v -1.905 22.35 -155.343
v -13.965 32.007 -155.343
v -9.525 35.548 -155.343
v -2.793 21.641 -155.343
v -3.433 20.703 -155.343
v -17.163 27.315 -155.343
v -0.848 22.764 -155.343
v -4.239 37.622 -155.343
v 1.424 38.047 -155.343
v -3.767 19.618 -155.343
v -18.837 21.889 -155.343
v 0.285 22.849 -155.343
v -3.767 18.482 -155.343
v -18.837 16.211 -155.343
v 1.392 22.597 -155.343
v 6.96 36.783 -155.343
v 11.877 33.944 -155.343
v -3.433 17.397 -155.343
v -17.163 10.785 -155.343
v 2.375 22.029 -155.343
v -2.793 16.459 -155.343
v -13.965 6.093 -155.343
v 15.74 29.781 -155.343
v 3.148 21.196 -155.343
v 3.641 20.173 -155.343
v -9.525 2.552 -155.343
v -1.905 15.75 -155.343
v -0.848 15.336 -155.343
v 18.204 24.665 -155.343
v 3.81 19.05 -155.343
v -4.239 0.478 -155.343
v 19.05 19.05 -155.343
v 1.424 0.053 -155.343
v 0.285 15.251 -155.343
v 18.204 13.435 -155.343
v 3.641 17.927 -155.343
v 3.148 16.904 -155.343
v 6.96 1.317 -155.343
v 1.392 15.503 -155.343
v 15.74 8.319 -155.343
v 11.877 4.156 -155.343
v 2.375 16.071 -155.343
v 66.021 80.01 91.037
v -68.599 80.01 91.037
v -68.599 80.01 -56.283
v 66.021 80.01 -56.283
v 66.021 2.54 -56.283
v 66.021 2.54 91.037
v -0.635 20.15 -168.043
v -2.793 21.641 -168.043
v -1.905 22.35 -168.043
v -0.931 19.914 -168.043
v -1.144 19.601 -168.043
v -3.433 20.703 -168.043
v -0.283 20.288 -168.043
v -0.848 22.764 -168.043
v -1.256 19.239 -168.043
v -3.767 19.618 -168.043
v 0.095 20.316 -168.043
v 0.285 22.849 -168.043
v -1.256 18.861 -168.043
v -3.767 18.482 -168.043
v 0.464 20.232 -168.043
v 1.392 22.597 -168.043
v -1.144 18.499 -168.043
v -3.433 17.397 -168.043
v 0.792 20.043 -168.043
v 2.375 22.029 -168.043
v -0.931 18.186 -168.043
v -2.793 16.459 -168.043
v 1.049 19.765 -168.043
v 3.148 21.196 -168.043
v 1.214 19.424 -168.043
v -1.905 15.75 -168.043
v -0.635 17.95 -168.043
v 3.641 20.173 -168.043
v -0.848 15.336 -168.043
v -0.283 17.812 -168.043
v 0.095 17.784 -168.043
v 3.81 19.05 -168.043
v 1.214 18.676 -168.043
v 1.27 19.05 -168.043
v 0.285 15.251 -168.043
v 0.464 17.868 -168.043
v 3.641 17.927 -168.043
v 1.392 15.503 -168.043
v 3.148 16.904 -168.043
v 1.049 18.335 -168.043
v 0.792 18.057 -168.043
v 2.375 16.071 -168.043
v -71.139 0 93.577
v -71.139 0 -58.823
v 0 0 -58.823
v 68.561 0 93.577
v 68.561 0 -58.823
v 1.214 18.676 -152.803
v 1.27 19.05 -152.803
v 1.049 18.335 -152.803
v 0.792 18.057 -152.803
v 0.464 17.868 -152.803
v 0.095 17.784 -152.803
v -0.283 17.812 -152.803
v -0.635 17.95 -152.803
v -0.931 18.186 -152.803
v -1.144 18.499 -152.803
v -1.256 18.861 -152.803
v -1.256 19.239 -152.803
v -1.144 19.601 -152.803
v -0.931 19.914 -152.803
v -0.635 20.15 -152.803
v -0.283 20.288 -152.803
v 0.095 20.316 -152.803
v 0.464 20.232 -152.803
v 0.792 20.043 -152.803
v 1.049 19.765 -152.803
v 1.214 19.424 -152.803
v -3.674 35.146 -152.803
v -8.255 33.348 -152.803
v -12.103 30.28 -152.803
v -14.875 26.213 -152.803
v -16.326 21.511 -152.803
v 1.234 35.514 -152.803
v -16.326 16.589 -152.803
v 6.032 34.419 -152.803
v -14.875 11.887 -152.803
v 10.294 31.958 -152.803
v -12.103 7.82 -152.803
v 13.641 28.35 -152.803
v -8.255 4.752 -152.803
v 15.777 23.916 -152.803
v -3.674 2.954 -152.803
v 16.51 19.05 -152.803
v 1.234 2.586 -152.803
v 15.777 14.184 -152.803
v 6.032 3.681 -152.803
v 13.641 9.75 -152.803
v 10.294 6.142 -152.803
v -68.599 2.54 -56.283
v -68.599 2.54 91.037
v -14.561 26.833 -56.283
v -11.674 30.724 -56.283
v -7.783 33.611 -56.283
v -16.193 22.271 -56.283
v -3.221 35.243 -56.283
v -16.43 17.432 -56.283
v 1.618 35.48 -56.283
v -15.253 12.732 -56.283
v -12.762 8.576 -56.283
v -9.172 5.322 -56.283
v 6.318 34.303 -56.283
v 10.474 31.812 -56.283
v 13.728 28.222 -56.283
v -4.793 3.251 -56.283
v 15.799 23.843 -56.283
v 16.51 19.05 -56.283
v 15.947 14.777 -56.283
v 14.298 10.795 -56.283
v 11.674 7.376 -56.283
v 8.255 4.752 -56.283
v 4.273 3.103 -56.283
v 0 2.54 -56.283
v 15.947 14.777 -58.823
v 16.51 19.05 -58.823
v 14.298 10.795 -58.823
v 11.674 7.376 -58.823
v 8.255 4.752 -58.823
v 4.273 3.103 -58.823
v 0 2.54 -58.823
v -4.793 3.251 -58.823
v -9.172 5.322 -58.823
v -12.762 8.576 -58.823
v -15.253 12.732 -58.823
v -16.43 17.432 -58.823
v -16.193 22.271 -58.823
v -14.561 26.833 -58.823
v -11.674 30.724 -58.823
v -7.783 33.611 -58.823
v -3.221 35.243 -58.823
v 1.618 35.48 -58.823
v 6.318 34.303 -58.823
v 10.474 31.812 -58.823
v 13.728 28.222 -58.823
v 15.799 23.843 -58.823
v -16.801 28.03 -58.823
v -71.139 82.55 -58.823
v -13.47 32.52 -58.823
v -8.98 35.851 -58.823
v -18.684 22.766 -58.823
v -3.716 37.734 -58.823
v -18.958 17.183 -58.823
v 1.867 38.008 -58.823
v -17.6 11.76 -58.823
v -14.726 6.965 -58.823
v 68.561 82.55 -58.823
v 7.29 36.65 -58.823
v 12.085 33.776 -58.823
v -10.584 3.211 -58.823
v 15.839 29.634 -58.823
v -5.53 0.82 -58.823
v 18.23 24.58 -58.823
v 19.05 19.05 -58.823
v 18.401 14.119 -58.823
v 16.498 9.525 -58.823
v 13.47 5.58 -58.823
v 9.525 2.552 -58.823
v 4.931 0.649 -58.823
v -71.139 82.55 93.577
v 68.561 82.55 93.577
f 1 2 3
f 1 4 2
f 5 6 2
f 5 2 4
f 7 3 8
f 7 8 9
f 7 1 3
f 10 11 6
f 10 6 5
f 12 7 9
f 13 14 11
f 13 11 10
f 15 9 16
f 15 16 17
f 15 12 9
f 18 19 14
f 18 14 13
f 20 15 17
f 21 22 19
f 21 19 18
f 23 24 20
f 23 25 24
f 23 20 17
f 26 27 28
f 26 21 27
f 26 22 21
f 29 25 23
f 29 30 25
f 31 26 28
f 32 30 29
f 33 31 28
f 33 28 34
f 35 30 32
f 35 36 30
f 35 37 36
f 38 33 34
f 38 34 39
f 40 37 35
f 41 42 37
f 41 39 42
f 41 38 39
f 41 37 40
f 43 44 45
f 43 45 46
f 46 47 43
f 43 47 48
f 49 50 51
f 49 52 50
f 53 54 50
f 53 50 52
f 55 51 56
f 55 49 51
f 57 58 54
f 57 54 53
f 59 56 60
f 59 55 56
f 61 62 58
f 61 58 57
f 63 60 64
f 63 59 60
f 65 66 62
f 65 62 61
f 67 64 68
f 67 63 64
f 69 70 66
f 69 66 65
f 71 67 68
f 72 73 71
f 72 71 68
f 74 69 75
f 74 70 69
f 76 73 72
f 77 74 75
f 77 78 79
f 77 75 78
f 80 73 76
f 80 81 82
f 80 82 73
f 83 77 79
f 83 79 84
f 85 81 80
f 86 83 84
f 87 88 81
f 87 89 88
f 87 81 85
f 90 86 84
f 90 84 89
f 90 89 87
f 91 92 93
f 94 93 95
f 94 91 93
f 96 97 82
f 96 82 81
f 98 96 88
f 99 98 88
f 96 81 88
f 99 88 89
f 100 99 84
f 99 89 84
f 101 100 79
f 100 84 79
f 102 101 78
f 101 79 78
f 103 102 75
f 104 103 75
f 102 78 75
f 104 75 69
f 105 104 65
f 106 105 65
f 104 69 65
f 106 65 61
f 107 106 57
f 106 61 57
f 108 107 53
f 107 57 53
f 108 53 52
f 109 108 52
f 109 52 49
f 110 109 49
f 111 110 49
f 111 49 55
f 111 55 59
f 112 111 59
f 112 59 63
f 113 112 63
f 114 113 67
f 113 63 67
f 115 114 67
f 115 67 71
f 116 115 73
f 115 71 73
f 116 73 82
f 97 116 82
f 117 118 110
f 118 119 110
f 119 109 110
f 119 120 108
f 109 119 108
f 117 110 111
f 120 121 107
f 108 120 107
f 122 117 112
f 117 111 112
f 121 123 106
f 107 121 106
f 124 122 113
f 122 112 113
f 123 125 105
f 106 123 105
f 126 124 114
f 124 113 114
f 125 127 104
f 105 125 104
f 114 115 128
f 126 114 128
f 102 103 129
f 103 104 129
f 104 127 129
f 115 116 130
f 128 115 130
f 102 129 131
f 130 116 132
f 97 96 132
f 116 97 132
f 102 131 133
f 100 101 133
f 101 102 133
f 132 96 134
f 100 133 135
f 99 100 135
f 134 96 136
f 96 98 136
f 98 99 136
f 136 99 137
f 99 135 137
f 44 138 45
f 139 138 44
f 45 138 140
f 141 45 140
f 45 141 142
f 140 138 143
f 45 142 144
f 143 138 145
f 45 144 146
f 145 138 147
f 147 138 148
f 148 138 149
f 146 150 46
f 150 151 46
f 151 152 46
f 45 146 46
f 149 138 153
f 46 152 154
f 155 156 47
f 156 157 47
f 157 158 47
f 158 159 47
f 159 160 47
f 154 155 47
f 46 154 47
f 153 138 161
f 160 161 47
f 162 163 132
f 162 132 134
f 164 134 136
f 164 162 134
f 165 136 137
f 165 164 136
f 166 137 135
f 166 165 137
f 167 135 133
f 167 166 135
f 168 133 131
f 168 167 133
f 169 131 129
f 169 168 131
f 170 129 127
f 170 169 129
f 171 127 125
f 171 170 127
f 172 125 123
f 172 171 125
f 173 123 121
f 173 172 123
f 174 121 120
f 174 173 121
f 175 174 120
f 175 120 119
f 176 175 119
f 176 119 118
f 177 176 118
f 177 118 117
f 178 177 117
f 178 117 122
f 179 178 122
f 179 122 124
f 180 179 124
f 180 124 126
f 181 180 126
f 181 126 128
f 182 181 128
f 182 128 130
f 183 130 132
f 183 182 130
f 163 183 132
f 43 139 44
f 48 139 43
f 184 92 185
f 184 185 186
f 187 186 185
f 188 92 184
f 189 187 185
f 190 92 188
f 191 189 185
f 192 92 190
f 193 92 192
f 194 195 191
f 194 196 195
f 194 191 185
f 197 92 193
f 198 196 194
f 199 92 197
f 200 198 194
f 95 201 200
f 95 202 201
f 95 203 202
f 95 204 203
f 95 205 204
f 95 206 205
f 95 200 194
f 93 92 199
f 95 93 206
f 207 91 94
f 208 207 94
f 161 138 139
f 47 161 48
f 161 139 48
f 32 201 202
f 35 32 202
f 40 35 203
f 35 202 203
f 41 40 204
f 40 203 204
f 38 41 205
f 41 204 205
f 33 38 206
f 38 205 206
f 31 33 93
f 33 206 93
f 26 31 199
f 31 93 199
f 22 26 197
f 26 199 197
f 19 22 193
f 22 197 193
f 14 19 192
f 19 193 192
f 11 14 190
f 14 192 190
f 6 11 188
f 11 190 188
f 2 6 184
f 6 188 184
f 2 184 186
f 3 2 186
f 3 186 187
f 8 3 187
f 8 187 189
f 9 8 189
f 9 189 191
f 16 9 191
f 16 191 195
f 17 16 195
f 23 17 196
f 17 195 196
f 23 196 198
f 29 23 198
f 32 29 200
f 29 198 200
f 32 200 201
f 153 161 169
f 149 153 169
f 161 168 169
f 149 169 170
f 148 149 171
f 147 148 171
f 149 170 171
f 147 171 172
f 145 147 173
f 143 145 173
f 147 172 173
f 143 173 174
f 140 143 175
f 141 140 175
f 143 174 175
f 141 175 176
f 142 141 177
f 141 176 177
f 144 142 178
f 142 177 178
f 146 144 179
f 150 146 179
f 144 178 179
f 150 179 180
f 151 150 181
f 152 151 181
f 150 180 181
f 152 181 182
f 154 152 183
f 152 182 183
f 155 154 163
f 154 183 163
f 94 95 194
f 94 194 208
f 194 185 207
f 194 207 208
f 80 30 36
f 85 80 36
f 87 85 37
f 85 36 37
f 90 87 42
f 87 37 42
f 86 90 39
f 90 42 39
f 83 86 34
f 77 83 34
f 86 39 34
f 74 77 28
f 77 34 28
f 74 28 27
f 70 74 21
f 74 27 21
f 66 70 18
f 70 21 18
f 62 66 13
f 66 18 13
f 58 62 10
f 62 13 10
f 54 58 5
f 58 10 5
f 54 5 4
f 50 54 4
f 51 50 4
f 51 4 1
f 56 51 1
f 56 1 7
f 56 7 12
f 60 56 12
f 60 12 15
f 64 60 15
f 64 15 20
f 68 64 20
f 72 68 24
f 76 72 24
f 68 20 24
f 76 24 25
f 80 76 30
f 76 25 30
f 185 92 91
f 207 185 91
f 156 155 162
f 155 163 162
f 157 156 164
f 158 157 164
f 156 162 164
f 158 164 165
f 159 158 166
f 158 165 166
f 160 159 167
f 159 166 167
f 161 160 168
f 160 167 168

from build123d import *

# Parameters (mm, degrees)
F0_W        = 139.7
F0_H        = 152.4
F1_DEPTH    = 82.55
F2_R        = 19.05
F3_DEPTH    = 96.52
F4_R        = 3.81
F5_DEPTH    = 12.7
F6_T        = 2.54
F6_T4_ANGLE = 270.000000001
F6_T6_ANGLE = 90.000000001


# Not quite as in the source:
# - a shell that OpenCascade refuses in one call is made with other operations: the cavity is built on its own and cut out


with BuildPart() as f1:
    # F0 (on Front) → F1 (new body)
    with BuildSketch(Plane.XZ):
        with Locations((-1.2888036728, 17.3768577993)):
            Rectangle(F0_W, F0_H)
    extrude(amount=-F1_DEPTH)

    # F2 (on face) → F3 (join)
    with BuildSketch(Plane(origin=(0, 0, -58.8231422007), x_dir=(1, 0, 0), z_dir=(0, 0, -1))):
        with Locations((0, -19.05)):
            Circle(F2_R)
    extrude(amount=F3_DEPTH)

    # F4 (on face) → F5 (join)
    with BuildSketch(Plane(origin=(0, 0, -155.3431422007), x_dir=(1, 0, 0), z_dir=(0, 0, -1))):
        with Locations((0, -19.05)):
            Circle(F4_R)
    extrude(amount=F5_DEPTH)

    # F6: shell of thickness 2.54, made by hand


with BuildPart() as f6_core1:
    # F6_t2: copy of F1
    add(f1.part)

    # the walls: a layer under each face that stays
    f6_faces = [f6_core1.faces().sort_by_distance(p)[0] for p in [
        (-1.2888036728, 41.275, 93.5768577993),
        (68.5611963272, 41.275, 17.3768577993),
        (-71.1388036728, 41.275, 17.3768577993),
        (-1.2888036728, 0, 17.3768577993),
        (-1.2888036728, 82.55, 17.3768577993),
        (-1.2888036728, 41.275, -58.8231422007),
        (-19.05, 19.05, -107.0831422007),
        (-12.7, 31.75, -155.3431422007),
        (-3.81, 19.05, -161.6931422007),
    ]]
    thicken(f6_faces, amount=-F6_T, mode=Mode.SUBTRACT)

    # F6_s3 → F6_t4 (revolve, cut)
    with BuildSketch(Plane.YZ):
        Polygon((-0.0254, -58.8485422007), (0, -56.2831422007), (2.54, -56.2831422007), (2.54, -58.8231422007), align=None)
    revolve(axis=Axis((0, 19.05, -58.8231422007), (0, 0, -1)), revolution_arc=F6_T4_ANGLE, mode=Mode.SUBTRACT)

    # F6_s5 → F6_t6 (revolve, cut)
    with BuildSketch(Plane.XZ.offset(-19.05)):
        Polygon((19.0754, -58.8485422007), (19.05, -56.2831422007), (16.51, -56.2831422007), (16.51, -58.8231422007), align=None)
    revolve(axis=Axis((0, 19.05, -58.8231422007), (0, 0, -1)), revolution_arc=F6_T6_ANGLE, mode=Mode.SUBTRACT)

    # F6_s7 → F6_t8 (revolve, cut)
    with BuildSketch(Plane.XZ.offset(-19.05)):
        Polygon((3.8354, -155.3685422007), (3.81, -152.8031422007), (1.27, -152.8031422007), (1.27, -155.3431422007), align=None)
    revolve(axis=Axis((0, 19.05, -155.3431422007), (0, 0, -1)), mode=Mode.SUBTRACT)


with BuildPart() as f1_1:
    add(f1.part)

    # what is left inside the walls is the cavity
    f6_cavity = [f6_core1.part.solids().sort_by_distance(p)[0] for p in [
        (-1.288804, 79.9846, -7.176476),
    ]]
    add(f6_cavity, mode=Mode.SUBTRACT)


solid = f1_1.part
